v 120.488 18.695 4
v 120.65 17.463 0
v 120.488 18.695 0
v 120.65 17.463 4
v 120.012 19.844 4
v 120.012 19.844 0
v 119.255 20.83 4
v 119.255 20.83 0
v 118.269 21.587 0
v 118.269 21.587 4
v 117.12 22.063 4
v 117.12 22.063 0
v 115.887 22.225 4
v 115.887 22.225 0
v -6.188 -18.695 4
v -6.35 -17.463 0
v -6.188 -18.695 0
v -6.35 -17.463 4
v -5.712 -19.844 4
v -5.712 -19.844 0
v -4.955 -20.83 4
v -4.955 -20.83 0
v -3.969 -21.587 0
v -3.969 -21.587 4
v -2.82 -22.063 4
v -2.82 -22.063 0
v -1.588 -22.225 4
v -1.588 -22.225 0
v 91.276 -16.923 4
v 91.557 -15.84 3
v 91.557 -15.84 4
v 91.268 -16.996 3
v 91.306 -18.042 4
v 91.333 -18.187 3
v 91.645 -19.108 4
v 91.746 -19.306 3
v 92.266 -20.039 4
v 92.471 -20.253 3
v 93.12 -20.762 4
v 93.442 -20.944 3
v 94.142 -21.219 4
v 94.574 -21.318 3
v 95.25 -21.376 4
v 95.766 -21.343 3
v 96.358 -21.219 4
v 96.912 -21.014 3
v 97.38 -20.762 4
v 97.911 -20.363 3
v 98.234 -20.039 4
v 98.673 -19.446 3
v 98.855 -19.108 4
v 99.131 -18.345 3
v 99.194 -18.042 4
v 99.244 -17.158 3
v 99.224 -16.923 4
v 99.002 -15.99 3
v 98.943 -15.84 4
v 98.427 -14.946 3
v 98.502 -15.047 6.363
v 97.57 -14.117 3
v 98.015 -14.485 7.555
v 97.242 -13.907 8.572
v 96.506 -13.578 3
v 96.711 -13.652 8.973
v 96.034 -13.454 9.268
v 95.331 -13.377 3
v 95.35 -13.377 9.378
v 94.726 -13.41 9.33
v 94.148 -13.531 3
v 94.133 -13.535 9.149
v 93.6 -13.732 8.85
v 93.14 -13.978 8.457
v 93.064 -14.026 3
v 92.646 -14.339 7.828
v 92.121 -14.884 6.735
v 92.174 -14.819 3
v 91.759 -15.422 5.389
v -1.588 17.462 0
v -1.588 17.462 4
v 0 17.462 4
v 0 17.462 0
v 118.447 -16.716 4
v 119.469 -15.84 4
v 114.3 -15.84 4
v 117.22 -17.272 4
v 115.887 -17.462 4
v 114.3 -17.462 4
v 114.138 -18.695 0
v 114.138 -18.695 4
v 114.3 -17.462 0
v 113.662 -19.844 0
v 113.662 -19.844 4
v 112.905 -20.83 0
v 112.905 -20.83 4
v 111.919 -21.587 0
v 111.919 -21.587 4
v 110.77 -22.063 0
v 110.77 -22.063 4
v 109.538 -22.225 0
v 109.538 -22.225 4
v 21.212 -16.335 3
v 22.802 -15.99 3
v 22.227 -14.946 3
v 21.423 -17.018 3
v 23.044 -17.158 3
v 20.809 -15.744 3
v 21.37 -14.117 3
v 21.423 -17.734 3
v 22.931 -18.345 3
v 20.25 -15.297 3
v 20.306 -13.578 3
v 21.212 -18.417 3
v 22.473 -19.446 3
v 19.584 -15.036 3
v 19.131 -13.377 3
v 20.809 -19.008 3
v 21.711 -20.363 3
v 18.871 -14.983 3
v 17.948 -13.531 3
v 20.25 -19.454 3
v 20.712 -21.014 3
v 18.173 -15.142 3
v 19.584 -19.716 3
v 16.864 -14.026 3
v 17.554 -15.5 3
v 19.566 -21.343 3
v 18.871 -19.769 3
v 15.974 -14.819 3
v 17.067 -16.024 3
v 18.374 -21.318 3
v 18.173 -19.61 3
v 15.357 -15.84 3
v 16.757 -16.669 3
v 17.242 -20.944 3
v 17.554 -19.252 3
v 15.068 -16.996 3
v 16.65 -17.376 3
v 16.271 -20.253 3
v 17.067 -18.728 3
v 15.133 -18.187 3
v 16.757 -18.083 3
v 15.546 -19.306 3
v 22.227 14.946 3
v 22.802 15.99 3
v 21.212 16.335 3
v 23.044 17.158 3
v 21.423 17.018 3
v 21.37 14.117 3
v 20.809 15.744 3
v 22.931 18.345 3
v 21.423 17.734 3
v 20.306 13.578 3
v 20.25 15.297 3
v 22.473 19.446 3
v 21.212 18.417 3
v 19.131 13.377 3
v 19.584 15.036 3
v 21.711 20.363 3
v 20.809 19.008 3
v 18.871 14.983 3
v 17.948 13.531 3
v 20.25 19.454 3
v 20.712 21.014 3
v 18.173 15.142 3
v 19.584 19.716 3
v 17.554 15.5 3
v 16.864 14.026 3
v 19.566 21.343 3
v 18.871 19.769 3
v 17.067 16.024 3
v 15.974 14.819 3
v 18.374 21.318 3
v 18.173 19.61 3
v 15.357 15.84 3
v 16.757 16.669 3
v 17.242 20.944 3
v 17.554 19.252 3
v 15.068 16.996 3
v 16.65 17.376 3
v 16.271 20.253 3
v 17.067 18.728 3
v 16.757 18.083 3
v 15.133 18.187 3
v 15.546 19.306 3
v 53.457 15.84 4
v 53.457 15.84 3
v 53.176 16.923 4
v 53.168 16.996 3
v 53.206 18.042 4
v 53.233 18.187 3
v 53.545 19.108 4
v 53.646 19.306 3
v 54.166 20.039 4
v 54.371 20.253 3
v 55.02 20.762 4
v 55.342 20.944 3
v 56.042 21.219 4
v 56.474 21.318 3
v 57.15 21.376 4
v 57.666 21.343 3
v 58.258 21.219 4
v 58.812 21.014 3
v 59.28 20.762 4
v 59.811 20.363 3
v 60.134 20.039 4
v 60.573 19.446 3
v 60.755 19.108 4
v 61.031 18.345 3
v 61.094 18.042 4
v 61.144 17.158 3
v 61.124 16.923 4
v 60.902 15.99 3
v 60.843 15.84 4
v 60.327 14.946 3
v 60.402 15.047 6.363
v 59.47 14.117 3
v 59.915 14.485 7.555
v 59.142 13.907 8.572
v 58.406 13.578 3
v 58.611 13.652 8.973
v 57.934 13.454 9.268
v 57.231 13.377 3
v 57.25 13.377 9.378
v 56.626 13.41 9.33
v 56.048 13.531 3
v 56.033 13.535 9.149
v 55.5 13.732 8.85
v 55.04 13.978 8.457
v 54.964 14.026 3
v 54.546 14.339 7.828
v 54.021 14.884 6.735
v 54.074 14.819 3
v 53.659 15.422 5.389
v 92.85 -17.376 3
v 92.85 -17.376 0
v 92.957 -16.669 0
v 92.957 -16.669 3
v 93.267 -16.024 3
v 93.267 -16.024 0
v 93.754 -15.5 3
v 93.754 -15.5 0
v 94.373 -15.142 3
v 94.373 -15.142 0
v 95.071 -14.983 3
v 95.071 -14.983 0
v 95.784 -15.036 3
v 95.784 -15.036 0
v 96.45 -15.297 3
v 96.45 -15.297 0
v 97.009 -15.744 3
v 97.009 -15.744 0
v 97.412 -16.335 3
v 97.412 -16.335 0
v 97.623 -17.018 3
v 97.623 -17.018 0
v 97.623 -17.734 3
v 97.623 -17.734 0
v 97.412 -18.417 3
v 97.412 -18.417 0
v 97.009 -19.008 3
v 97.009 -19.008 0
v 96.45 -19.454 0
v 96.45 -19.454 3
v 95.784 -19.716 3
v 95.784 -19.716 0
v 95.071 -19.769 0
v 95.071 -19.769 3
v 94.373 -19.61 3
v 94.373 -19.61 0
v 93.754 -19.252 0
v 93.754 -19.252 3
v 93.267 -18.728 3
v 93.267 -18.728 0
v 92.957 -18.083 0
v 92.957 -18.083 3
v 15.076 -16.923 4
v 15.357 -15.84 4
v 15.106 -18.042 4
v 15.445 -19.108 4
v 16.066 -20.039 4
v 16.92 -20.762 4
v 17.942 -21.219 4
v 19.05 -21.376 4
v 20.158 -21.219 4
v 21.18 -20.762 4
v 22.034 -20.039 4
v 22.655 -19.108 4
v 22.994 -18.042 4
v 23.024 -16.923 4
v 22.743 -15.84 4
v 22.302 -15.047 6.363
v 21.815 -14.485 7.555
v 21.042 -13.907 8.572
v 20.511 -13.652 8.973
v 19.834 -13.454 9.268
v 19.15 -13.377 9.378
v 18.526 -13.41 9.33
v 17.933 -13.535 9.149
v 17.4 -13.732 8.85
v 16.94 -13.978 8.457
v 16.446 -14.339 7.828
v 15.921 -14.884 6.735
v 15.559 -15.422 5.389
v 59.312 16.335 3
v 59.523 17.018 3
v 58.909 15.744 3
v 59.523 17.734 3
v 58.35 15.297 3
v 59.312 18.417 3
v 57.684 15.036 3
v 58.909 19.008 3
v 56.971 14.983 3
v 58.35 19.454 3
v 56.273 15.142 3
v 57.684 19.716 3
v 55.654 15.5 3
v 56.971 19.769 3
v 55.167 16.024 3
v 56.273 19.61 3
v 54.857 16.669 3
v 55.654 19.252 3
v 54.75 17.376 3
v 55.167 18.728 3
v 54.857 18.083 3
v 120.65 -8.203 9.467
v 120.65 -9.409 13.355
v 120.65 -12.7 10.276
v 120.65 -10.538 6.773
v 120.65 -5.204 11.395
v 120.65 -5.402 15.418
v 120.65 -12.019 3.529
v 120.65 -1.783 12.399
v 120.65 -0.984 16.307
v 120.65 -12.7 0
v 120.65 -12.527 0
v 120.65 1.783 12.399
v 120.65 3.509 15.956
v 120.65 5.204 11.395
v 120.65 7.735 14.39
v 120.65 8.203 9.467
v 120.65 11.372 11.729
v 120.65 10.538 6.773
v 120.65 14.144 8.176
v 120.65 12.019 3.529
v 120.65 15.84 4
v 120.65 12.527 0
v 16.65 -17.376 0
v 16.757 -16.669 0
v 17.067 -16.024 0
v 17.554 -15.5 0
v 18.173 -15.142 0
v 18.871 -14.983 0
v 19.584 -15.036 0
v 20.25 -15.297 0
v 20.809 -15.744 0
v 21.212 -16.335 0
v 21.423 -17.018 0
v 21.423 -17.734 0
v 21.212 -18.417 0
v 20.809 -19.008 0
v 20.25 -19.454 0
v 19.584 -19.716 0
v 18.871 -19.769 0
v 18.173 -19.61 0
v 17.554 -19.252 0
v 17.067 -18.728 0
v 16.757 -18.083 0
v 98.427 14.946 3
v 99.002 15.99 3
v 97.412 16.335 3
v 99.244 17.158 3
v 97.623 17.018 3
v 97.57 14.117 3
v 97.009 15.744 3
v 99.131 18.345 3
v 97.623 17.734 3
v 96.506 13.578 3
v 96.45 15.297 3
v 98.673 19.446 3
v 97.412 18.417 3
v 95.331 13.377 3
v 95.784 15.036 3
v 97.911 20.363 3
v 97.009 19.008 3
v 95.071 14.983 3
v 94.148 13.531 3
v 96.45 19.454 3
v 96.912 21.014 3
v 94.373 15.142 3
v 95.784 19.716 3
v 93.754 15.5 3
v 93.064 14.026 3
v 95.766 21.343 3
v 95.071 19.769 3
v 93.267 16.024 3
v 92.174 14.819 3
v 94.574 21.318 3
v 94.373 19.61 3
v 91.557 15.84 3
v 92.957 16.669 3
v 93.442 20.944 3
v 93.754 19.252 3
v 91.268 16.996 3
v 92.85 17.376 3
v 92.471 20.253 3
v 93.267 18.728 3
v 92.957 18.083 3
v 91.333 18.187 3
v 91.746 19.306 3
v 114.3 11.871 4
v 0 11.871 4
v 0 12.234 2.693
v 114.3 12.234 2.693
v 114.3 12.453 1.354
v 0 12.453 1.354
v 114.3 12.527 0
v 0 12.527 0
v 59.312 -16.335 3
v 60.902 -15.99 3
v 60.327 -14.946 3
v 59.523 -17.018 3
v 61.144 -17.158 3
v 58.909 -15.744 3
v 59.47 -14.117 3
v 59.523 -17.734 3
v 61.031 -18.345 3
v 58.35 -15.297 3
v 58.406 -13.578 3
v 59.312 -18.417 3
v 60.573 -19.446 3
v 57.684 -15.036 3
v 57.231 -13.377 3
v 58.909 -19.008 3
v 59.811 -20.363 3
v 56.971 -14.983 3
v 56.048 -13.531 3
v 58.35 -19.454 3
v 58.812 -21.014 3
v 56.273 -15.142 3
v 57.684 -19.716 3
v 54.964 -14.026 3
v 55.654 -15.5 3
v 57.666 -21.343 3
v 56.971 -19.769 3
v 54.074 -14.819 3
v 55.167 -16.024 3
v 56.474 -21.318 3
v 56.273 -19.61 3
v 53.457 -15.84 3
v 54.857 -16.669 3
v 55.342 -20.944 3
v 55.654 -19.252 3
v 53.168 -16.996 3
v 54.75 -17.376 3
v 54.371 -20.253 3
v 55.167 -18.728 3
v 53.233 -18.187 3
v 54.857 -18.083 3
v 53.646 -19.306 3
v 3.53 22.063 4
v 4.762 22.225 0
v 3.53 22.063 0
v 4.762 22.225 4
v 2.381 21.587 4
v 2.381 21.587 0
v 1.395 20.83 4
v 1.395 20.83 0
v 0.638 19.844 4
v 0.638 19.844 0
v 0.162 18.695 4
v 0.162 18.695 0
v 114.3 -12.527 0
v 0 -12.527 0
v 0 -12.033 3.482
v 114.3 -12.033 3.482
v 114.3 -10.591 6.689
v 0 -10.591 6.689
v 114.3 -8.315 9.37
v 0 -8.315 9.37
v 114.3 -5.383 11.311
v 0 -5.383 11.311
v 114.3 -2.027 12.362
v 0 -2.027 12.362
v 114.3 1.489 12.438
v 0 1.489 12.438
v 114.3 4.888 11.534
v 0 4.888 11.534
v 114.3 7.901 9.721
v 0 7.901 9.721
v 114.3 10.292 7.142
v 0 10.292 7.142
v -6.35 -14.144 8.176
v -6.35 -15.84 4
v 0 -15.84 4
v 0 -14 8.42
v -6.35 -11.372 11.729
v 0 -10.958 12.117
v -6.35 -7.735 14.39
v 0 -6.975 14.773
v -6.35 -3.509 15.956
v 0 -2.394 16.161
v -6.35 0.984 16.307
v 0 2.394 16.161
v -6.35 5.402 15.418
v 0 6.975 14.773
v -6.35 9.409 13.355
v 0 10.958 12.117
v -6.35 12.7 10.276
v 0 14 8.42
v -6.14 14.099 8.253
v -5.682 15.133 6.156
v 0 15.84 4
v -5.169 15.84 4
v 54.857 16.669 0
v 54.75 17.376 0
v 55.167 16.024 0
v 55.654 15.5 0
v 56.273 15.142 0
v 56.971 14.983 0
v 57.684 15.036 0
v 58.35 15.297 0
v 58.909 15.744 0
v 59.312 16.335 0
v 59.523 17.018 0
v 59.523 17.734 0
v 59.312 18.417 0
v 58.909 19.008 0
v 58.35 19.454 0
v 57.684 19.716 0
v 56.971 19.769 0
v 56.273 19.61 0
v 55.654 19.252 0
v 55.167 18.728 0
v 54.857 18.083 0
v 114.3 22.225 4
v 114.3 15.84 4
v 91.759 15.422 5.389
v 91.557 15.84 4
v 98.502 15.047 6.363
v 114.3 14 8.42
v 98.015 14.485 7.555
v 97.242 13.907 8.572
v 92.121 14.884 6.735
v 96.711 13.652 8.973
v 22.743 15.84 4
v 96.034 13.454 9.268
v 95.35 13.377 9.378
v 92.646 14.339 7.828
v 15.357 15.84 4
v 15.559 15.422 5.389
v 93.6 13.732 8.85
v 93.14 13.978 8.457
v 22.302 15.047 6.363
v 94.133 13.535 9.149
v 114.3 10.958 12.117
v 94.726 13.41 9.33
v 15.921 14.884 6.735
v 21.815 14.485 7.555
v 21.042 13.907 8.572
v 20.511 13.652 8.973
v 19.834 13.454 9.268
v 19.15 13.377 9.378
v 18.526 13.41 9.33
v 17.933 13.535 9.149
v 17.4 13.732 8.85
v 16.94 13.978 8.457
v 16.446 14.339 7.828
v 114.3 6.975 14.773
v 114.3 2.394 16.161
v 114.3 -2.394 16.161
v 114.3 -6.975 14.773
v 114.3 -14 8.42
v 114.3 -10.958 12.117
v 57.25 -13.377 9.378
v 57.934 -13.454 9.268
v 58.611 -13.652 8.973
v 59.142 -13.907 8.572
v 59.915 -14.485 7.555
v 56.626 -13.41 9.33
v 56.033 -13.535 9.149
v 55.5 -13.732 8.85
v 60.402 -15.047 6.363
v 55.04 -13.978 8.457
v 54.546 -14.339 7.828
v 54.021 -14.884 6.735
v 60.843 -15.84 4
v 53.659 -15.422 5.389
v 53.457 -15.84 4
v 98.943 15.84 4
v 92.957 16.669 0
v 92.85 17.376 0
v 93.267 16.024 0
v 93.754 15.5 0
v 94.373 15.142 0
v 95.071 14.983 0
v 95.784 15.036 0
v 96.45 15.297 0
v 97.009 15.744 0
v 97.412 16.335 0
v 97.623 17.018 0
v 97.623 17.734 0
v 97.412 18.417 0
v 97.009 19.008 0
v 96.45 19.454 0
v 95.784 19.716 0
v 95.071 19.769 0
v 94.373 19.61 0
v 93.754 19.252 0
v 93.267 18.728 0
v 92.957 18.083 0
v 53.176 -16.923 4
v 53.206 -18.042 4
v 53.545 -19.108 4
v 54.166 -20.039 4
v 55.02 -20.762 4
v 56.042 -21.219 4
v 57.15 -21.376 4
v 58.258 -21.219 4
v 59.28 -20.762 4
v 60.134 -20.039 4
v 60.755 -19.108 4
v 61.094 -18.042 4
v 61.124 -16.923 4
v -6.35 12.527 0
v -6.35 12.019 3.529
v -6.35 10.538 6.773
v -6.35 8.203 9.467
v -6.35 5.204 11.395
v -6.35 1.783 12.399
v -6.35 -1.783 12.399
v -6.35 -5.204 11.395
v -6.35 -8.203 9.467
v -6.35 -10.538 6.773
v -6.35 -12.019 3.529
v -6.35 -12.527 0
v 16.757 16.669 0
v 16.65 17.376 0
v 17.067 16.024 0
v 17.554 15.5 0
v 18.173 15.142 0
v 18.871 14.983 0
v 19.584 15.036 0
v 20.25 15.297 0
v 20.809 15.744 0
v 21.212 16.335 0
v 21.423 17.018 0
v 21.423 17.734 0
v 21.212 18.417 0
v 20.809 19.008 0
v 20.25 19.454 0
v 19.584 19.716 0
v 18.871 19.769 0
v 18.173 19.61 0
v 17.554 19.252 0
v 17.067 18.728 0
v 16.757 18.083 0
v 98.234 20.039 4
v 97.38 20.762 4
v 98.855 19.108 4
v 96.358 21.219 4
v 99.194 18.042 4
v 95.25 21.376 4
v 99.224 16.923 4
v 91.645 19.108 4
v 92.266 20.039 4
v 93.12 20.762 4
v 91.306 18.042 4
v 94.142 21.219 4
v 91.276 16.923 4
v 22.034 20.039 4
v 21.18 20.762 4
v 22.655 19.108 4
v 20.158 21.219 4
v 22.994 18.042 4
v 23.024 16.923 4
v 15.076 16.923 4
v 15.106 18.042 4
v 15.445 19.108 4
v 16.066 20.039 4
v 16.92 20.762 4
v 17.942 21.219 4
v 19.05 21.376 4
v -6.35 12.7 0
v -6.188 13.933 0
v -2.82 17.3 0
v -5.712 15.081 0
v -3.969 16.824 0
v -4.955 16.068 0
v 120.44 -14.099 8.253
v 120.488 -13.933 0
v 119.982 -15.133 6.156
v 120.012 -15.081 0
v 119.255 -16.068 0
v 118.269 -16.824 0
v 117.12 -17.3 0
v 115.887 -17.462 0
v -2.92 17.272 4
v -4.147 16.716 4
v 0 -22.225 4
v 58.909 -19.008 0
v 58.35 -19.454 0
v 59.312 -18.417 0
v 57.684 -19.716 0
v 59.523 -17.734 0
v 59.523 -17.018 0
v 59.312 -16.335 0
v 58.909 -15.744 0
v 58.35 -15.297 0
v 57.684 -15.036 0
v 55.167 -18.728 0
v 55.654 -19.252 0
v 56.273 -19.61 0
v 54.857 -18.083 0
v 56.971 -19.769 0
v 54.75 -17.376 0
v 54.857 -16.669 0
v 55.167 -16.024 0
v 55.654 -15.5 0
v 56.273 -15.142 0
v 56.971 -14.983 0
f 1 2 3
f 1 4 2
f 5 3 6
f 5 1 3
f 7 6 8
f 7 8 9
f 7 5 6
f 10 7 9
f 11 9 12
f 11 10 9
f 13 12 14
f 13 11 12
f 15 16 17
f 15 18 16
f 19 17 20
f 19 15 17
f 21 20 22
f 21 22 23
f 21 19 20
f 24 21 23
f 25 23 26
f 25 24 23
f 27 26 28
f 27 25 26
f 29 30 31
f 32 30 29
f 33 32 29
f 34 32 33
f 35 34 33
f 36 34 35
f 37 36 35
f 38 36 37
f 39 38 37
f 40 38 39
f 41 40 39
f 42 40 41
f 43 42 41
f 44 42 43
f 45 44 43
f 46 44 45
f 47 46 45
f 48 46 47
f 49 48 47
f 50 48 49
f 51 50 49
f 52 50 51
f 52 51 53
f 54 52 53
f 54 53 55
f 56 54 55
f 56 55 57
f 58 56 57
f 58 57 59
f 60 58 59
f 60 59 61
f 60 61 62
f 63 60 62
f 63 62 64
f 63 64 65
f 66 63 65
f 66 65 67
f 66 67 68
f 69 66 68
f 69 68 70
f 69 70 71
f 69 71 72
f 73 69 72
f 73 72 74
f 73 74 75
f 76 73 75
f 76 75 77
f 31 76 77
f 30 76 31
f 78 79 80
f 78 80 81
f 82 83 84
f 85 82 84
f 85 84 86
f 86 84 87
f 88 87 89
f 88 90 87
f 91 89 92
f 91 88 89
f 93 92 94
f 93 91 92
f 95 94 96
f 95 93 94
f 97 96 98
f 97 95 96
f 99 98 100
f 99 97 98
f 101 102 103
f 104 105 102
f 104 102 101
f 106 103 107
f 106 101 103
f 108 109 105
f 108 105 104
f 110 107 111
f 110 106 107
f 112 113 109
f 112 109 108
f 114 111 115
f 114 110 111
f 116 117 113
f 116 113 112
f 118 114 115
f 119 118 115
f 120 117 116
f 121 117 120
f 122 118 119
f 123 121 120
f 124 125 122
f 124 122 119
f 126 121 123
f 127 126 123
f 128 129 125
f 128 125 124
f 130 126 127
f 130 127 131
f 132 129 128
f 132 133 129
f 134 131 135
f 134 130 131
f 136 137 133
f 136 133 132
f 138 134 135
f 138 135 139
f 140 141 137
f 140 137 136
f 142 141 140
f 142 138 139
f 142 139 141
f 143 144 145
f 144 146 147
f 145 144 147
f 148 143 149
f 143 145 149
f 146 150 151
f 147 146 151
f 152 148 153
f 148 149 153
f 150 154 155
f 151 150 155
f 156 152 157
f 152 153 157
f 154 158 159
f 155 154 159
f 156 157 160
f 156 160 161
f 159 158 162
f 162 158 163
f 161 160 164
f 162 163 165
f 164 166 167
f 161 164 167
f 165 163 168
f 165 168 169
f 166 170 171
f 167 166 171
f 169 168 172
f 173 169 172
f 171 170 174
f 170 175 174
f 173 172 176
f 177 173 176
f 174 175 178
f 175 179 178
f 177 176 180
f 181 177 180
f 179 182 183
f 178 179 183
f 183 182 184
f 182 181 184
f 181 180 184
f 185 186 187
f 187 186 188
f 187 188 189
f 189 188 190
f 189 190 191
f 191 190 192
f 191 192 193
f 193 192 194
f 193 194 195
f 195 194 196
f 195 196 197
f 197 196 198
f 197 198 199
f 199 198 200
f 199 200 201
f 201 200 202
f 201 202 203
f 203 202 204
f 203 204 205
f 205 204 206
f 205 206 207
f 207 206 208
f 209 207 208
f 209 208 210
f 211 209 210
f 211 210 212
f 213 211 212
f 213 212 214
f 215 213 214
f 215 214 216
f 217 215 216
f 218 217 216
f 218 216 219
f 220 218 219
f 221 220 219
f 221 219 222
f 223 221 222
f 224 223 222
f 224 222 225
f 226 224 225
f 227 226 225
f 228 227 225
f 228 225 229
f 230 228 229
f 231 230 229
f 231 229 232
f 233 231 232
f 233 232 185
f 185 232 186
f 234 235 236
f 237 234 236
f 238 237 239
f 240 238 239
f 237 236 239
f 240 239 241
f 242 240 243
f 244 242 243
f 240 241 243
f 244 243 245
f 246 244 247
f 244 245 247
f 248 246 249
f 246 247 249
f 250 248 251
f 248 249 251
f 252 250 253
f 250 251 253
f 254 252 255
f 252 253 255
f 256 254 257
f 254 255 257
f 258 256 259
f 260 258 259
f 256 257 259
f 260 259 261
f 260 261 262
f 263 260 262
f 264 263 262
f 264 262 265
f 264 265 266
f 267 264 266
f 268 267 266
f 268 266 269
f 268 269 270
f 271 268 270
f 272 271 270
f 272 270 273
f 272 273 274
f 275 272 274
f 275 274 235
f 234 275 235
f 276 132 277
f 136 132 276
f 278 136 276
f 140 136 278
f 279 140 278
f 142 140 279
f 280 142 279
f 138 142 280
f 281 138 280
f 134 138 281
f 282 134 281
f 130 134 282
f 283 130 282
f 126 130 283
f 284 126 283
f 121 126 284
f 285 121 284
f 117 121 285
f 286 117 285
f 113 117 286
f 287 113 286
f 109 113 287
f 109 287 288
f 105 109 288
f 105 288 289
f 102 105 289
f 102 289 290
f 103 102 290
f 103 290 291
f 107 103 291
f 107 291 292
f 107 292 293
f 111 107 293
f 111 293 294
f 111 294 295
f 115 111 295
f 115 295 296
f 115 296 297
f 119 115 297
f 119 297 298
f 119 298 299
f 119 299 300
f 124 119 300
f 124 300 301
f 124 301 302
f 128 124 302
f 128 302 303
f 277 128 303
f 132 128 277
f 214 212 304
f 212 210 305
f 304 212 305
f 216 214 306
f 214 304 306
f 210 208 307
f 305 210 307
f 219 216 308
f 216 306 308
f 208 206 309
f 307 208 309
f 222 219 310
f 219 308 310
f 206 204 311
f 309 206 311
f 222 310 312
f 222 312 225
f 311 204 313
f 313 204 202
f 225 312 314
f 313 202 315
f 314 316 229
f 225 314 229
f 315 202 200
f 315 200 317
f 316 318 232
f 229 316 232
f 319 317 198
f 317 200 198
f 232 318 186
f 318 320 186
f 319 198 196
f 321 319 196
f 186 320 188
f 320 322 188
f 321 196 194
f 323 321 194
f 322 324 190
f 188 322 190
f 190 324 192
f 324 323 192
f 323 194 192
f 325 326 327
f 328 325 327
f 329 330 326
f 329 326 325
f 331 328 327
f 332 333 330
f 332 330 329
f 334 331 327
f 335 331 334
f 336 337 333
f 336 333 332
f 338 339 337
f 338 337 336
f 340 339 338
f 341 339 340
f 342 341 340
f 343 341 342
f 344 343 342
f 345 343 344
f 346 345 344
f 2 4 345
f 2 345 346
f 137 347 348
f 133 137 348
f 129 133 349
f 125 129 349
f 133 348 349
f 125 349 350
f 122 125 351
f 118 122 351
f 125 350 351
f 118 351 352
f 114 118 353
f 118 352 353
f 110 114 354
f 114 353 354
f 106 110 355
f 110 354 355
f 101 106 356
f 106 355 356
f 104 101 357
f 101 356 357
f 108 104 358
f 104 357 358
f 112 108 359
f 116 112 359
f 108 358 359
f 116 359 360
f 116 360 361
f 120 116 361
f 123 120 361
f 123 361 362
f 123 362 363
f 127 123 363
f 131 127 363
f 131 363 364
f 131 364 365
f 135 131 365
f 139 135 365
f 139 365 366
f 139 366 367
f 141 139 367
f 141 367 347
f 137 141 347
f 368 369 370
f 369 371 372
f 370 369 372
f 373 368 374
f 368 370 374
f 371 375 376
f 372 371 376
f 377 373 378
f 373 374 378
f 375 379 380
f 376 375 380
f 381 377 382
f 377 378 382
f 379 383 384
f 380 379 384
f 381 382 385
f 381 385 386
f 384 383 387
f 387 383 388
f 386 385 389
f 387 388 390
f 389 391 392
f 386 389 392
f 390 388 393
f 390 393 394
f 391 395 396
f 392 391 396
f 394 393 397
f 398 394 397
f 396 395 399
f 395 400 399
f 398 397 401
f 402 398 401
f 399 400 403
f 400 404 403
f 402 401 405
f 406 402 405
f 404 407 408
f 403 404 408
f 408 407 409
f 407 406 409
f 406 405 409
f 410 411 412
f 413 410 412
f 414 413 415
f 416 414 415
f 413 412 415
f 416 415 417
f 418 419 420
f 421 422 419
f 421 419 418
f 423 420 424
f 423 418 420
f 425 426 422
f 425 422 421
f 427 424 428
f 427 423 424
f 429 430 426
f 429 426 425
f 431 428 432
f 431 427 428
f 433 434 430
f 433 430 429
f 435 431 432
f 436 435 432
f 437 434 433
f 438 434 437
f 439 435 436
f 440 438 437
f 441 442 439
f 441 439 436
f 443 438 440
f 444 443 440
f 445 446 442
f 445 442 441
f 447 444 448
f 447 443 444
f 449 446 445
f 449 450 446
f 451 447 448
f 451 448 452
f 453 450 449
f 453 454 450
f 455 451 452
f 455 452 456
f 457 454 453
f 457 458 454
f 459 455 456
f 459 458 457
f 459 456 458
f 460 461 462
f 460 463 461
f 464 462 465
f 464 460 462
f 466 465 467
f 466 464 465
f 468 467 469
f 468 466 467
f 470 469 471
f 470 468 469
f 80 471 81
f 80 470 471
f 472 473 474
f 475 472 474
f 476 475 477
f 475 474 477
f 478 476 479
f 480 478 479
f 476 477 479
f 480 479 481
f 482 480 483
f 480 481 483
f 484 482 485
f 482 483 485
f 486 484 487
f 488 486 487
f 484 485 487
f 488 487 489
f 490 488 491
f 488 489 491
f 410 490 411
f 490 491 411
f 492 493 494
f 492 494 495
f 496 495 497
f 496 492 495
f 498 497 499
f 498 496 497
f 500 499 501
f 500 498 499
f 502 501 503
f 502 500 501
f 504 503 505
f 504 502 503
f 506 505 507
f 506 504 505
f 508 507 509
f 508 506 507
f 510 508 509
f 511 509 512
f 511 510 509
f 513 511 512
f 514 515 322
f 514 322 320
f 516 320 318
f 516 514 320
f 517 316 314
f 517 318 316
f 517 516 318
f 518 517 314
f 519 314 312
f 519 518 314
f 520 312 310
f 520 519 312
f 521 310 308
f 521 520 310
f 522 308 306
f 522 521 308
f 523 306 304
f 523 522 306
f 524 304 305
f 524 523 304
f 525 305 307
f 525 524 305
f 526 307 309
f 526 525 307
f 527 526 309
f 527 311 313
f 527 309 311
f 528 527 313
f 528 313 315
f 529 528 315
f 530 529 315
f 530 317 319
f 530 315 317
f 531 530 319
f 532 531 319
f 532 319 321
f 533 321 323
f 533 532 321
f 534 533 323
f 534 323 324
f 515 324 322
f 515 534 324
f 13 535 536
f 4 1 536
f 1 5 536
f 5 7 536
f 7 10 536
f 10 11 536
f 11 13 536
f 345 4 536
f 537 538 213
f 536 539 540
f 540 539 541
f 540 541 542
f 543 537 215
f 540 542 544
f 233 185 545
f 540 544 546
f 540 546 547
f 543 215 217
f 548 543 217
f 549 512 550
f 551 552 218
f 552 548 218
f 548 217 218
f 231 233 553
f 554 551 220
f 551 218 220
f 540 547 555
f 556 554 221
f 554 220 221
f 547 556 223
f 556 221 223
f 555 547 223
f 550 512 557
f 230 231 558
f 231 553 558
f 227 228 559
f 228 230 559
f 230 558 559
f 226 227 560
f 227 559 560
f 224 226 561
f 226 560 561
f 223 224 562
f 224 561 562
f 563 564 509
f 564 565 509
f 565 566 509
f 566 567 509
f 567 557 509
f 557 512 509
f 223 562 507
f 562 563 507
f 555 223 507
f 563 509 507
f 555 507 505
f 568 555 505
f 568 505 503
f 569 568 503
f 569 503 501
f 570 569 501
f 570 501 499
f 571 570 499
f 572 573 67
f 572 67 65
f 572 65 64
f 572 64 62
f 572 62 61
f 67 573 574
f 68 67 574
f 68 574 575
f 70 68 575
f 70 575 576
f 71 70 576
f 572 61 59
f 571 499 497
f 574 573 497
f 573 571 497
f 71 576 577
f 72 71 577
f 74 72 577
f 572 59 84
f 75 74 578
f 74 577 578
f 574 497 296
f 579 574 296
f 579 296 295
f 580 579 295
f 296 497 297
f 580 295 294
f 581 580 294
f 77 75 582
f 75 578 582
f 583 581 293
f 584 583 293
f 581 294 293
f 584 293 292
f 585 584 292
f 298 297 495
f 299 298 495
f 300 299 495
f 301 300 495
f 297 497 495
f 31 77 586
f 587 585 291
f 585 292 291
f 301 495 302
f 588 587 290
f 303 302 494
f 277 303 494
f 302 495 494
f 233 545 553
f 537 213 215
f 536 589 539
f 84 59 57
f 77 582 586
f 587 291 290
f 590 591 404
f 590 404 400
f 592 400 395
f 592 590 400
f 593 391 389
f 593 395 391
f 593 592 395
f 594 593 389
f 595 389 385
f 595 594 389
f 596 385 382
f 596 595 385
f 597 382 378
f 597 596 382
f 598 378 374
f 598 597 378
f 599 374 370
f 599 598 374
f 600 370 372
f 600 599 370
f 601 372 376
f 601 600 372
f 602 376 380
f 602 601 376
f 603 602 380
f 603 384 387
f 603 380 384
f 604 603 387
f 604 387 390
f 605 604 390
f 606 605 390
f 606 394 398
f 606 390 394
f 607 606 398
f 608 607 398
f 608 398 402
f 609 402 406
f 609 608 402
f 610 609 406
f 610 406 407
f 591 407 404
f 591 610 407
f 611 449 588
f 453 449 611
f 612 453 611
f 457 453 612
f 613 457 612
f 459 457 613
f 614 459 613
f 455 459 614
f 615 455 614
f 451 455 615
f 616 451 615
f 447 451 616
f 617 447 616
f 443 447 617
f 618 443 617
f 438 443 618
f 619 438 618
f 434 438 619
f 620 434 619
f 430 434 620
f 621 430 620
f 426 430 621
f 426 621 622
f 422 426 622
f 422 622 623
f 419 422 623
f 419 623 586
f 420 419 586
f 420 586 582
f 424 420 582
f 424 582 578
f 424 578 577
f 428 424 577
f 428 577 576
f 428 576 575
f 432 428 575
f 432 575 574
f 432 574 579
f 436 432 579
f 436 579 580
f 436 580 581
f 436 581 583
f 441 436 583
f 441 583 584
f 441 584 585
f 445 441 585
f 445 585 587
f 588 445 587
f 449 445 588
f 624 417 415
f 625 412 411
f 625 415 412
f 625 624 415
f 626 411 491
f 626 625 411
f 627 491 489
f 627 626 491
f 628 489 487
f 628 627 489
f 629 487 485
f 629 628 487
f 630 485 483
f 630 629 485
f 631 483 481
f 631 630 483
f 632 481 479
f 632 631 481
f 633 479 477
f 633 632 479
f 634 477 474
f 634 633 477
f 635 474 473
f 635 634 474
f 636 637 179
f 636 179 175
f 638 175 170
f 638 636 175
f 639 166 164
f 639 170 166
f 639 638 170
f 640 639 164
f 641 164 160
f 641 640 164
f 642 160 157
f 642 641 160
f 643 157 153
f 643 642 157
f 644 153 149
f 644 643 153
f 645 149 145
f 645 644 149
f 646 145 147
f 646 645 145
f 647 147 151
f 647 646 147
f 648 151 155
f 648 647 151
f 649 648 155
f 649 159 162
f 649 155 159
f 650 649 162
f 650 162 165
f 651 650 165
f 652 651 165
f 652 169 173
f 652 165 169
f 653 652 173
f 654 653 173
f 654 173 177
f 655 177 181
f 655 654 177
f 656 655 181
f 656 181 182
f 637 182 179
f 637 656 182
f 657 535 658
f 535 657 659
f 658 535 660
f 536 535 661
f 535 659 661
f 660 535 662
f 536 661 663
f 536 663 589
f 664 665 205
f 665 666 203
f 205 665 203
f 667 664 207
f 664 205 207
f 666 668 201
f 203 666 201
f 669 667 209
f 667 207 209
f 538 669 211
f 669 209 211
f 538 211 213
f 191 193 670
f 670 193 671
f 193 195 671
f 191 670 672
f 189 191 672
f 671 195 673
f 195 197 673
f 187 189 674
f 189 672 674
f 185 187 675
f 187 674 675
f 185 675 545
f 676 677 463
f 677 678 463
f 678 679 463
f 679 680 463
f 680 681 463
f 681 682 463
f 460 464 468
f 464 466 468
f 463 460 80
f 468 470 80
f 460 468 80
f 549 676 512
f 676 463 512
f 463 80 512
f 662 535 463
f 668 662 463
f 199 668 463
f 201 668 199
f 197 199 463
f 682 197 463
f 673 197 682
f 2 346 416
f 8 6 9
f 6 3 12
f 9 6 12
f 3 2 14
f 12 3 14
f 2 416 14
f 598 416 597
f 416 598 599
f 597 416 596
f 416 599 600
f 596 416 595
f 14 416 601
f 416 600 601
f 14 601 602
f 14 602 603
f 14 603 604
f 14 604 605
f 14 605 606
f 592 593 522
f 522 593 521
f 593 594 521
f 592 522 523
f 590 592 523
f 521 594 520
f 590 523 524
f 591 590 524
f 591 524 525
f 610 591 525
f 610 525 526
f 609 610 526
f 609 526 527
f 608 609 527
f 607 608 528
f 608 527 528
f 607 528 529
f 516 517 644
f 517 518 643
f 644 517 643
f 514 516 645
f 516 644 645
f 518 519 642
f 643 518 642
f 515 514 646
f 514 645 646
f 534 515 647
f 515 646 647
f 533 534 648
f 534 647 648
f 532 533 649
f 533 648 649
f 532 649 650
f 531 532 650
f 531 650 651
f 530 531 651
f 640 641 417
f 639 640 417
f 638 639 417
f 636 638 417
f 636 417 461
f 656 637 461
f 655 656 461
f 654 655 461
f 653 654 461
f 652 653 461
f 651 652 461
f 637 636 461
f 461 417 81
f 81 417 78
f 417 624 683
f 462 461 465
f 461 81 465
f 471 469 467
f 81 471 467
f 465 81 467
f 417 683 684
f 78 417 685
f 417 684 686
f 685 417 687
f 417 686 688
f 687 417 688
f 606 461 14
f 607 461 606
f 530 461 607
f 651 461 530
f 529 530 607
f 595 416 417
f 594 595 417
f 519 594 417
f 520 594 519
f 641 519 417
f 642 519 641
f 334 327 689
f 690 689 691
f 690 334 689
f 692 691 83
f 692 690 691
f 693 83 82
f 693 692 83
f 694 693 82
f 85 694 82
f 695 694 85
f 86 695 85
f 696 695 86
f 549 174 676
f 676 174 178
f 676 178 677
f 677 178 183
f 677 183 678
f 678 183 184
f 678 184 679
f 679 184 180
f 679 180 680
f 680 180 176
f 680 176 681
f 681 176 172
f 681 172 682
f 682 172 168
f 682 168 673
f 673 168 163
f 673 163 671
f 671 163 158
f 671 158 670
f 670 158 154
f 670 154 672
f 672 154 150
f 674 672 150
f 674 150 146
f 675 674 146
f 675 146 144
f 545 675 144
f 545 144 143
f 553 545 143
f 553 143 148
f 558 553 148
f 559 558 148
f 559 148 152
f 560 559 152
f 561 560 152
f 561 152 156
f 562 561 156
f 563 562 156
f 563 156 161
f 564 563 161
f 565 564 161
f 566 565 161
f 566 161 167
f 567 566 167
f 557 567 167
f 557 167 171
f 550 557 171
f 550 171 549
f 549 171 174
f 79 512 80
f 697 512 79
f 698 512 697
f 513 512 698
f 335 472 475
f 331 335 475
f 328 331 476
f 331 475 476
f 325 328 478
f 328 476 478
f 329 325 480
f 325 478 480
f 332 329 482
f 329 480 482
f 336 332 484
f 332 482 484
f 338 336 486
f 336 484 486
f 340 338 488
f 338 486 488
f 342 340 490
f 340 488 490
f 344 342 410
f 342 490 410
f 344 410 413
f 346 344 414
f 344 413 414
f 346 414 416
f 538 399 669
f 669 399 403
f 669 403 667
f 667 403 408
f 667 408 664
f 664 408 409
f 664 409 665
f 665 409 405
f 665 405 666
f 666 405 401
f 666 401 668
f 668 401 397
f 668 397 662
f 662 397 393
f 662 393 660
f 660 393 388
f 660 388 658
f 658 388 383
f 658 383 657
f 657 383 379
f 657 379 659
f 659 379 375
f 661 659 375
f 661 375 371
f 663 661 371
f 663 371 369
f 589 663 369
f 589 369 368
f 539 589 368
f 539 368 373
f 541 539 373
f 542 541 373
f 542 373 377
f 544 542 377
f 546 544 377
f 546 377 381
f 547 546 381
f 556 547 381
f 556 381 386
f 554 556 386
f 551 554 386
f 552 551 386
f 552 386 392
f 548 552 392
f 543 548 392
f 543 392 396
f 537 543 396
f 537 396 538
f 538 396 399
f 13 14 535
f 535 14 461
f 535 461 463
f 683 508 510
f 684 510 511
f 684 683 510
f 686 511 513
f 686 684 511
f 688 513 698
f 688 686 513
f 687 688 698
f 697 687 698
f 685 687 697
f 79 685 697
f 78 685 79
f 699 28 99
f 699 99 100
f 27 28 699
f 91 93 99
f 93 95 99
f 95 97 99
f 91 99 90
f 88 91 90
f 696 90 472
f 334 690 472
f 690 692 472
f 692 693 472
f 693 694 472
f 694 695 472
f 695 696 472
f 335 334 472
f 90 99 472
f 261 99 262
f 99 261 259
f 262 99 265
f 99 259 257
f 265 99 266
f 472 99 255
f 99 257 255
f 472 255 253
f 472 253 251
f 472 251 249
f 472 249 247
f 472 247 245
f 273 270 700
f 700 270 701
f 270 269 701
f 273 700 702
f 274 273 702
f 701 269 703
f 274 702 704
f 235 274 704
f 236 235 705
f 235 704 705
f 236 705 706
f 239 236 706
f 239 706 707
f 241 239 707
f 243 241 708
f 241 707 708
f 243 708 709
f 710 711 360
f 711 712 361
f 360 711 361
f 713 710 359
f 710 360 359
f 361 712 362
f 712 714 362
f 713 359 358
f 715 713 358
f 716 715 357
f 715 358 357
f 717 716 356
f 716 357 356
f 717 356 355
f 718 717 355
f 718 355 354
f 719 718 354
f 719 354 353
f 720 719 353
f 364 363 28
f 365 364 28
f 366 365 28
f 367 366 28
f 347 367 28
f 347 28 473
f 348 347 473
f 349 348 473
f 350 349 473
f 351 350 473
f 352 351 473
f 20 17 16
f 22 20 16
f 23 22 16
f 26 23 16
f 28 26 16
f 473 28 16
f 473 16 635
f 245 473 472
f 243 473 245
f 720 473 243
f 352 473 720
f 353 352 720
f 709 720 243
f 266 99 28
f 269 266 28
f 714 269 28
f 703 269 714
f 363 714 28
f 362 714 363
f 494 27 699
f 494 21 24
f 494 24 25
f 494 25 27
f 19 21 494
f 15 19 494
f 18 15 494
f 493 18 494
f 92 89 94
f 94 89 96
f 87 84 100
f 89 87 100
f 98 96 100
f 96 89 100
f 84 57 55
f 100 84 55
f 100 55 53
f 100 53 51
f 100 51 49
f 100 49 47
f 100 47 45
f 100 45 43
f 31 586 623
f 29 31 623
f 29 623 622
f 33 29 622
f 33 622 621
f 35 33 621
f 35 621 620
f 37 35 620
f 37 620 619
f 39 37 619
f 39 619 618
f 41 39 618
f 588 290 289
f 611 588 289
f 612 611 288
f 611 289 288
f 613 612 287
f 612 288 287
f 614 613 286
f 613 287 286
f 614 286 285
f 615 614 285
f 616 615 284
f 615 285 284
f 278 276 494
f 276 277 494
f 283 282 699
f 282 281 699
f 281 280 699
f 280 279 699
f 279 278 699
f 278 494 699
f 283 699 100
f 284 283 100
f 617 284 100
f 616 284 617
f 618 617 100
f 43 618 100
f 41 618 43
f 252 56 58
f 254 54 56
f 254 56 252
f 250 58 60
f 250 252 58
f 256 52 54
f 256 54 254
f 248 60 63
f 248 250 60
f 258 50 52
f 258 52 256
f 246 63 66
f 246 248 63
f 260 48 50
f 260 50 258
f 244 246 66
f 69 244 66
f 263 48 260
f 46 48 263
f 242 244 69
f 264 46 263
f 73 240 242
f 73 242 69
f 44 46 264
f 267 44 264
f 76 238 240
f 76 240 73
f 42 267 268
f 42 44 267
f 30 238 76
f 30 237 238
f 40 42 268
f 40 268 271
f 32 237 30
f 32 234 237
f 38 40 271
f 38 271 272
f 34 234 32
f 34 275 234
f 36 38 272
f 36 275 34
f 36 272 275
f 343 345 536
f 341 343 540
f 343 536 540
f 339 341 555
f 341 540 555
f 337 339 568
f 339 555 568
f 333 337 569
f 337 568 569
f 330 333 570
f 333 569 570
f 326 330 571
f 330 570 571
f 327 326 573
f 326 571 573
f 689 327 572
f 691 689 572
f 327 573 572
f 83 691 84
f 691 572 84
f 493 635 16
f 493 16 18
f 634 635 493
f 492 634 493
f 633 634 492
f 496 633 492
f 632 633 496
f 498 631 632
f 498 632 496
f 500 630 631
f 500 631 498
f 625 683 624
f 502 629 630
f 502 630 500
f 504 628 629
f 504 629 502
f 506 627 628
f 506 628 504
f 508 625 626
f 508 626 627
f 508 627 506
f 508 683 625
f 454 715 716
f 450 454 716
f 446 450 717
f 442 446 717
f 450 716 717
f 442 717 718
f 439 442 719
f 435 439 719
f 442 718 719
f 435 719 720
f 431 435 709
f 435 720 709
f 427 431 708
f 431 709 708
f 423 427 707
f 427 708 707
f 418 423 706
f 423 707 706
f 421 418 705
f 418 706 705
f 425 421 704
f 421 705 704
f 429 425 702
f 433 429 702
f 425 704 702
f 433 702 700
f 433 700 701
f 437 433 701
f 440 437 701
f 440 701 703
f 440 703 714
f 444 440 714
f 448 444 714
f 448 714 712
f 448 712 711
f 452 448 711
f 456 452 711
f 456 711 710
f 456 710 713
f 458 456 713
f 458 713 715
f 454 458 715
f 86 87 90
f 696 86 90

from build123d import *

# Parameters (mm, degrees)
BOSS_EXTRUDE1_DEPTH  = 114.3
CUT_EXTRUDE1_START   = -1
SKETCH2_R            = 4
CUT_EXTRUDE1_DEPTH   = 7.35
M4_CLEARANCE_HOLE1_D = 4.8
FILLET1_R            = 4.7625
BOSS_EXTRUDE2_START  = 6.35
BOSS_EXTRUDE2_DEPTH  = 6.35
BOSS_EXTRUDE3_DEPTH  = 6.35
FILLET2_R            = 4.7625


with BuildPart() as part:
    # Sketch1 → Boss-Extrude1 (new body)
    with BuildSketch(Plane(origin=(0, 0, 0), x_dir=(0, 0, -1), z_dir=(1, 0, 0))):
        with BuildLine():
            Line((0, 22.225), (-4, 22.225))
            Line((-4, 22.225), (-4, 15.839643355))
            ThreePointArc((-3.999999999, 15.839643349), (-2.01539476, 16.212109221), (0, 16.336899995))
            Line((0, 16.336899995), (0, 17.4625))
            Line((0, 17.4625), (0, 22.225))
        make_face()
        with BuildLine():
            ThreePointArc((0, 16.336899995), (-2.01539476, 16.212109221), (-3.999999999, 15.839643349))
            ThreePointArc((-3.999999999, 15.839643349), (-16.336899991, 0), (-3.999999999, -15.839643349))
            ThreePointArc((-3.999999999, -15.839643349), (-2.01539476, -16.212109221), (0, -16.336899995))
            Line((0, -16.336899995), (0, -12.5269))
            ThreePointArc((0, -12.5269), (-12.361865073, -2.026700652), (-4, 11.871108778))
            ThreePointArc((-4, 11.871108778), (-2.026700652, 12.361865073), (0, 12.5269))
            Line((0, 12.5269), (0, 16.336899995))
        make_face()
        with BuildLine():
            ThreePointArc((0, -16.336899995), (-2.01539476, -16.212109221), (-3.999999999, -15.839643349))
            Line((-4, -15.839643355), (-4, -22.225))
            Line((-4, -22.225), (0, -22.225))
            Line((0, -22.225), (0, -17.4625))
            Line((0, -17.4625), (0, -16.336899995))
        make_face()
    extrude(amount=BOSS_EXTRUDE1_DEPTH)

    # Sketch2 → Cut-Extrude1 (cut)
    with BuildSketch(Plane.XY.offset(4).offset(CUT_EXTRUDE1_START)):
        with Locations(Location((19.05, -17.37595, 0), (0, 0, 157.413569734))):
            Circle(SKETCH2_R)
        with Locations(Location((57.15, -17.37595, 0), (0, 0, 157.413569734))):
            Circle(SKETCH2_R)
        with Locations(Location((95.25, -17.37595, 0), (0, 0, 157.413569734))):
            Circle(SKETCH2_R)
    cut_extrude1 = extrude(amount=CUT_EXTRUDE1_DEPTH, mode=Mode.SUBTRACT)

    # M4 Clearance Hole1 (through all)
    with Locations(Plane.XY.offset(4)):
        with Locations((19.05, -17.37595), (57.15, -17.37595), (95.25, -17.37595)):
            m4_clearance_hole1 = Hole(M4_CLEARANCE_HOLE1_D / 2)

    # Mirror1: Cut-Extrude1, M4 Clearance Hole1 across plane
    add(cut_extrude1.mirror(Plane.ZX), mode=Mode.SUBTRACT)
    add(m4_clearance_hole1.mirror(Plane.ZX), mode=Mode.SUBTRACT)

    # Fillet1
    fillet1_edges = [part.edges().sort_by_distance(p)[0] for p in [
        (0, 22.225, 2),
        (114.3, -22.225, 2),
    ]]
    fillet(fillet1_edges, radius=FILLET1_R)

    # Sketch8 → Boss-Extrude2 (add)
    with BuildSketch(Plane.ZY.offset(BOSS_EXTRUDE2_START)):
        with BuildLine():
            Line((3.999999999, 15.839643352), (4, 17.4625))
            Line((4, 17.4625), (0, 17.4625))
            Line((0, 17.4625), (0, 12.5269))
            ThreePointArc((0, 12.5269), (12.5269, 0), (0, -12.5269))
            Line((0, -12.5269), (0, -22.225))
            Line((0, -22.225), (4, -22.225))
            Line((4, -22.225), (3.999999999, -15.839643352))
            ThreePointArc((3.999999999, -15.839643352), (16.336899994, 0), (3.999999999, 15.839643352))
        make_face()
    extrude(amount=-BOSS_EXTRUDE2_DEPTH)

    # Sketch9 → Boss-Extrude3 (add)
    with BuildSketch(Plane(origin=(114.3, 0, 0), x_dir=(0, 0, -1), z_dir=(1, 0, 0))):
        with BuildLine():
            Line((-3.999999999, -15.839643352), (-4, -17.4625))
            Line((-4, -17.4625), (0, -17.4625))
            Line((0, -17.4625), (0, -12.5269))
            ThreePointArc((0, -12.5269), (-12.5269, 0), (0, 12.5269))
            Line((0, 12.5269), (0, 22.225))
            Line((0, 22.225), (-4, 22.225))
            Line((-4, 22.225), (-3.999999999, 15.839643352))
            ThreePointArc((-3.999999999, 15.839643352), (-16.336899994, 0), (-3.999999999, -15.839643352))
        make_face()
    extrude(amount=BOSS_EXTRUDE3_DEPTH)

    # Fillet2
    fillet2_edges = [part.edges().sort_by_distance(p)[0] for p in [
        (-6.35, 17.4625, 2),
        (-6.35, -22.225, 2),
        (120.65, -17.4625, 2),
        (120.65, 22.225, 2),
    ]]
    fillet(fillet2_edges, radius=FILLET2_R)


solid = part.part
